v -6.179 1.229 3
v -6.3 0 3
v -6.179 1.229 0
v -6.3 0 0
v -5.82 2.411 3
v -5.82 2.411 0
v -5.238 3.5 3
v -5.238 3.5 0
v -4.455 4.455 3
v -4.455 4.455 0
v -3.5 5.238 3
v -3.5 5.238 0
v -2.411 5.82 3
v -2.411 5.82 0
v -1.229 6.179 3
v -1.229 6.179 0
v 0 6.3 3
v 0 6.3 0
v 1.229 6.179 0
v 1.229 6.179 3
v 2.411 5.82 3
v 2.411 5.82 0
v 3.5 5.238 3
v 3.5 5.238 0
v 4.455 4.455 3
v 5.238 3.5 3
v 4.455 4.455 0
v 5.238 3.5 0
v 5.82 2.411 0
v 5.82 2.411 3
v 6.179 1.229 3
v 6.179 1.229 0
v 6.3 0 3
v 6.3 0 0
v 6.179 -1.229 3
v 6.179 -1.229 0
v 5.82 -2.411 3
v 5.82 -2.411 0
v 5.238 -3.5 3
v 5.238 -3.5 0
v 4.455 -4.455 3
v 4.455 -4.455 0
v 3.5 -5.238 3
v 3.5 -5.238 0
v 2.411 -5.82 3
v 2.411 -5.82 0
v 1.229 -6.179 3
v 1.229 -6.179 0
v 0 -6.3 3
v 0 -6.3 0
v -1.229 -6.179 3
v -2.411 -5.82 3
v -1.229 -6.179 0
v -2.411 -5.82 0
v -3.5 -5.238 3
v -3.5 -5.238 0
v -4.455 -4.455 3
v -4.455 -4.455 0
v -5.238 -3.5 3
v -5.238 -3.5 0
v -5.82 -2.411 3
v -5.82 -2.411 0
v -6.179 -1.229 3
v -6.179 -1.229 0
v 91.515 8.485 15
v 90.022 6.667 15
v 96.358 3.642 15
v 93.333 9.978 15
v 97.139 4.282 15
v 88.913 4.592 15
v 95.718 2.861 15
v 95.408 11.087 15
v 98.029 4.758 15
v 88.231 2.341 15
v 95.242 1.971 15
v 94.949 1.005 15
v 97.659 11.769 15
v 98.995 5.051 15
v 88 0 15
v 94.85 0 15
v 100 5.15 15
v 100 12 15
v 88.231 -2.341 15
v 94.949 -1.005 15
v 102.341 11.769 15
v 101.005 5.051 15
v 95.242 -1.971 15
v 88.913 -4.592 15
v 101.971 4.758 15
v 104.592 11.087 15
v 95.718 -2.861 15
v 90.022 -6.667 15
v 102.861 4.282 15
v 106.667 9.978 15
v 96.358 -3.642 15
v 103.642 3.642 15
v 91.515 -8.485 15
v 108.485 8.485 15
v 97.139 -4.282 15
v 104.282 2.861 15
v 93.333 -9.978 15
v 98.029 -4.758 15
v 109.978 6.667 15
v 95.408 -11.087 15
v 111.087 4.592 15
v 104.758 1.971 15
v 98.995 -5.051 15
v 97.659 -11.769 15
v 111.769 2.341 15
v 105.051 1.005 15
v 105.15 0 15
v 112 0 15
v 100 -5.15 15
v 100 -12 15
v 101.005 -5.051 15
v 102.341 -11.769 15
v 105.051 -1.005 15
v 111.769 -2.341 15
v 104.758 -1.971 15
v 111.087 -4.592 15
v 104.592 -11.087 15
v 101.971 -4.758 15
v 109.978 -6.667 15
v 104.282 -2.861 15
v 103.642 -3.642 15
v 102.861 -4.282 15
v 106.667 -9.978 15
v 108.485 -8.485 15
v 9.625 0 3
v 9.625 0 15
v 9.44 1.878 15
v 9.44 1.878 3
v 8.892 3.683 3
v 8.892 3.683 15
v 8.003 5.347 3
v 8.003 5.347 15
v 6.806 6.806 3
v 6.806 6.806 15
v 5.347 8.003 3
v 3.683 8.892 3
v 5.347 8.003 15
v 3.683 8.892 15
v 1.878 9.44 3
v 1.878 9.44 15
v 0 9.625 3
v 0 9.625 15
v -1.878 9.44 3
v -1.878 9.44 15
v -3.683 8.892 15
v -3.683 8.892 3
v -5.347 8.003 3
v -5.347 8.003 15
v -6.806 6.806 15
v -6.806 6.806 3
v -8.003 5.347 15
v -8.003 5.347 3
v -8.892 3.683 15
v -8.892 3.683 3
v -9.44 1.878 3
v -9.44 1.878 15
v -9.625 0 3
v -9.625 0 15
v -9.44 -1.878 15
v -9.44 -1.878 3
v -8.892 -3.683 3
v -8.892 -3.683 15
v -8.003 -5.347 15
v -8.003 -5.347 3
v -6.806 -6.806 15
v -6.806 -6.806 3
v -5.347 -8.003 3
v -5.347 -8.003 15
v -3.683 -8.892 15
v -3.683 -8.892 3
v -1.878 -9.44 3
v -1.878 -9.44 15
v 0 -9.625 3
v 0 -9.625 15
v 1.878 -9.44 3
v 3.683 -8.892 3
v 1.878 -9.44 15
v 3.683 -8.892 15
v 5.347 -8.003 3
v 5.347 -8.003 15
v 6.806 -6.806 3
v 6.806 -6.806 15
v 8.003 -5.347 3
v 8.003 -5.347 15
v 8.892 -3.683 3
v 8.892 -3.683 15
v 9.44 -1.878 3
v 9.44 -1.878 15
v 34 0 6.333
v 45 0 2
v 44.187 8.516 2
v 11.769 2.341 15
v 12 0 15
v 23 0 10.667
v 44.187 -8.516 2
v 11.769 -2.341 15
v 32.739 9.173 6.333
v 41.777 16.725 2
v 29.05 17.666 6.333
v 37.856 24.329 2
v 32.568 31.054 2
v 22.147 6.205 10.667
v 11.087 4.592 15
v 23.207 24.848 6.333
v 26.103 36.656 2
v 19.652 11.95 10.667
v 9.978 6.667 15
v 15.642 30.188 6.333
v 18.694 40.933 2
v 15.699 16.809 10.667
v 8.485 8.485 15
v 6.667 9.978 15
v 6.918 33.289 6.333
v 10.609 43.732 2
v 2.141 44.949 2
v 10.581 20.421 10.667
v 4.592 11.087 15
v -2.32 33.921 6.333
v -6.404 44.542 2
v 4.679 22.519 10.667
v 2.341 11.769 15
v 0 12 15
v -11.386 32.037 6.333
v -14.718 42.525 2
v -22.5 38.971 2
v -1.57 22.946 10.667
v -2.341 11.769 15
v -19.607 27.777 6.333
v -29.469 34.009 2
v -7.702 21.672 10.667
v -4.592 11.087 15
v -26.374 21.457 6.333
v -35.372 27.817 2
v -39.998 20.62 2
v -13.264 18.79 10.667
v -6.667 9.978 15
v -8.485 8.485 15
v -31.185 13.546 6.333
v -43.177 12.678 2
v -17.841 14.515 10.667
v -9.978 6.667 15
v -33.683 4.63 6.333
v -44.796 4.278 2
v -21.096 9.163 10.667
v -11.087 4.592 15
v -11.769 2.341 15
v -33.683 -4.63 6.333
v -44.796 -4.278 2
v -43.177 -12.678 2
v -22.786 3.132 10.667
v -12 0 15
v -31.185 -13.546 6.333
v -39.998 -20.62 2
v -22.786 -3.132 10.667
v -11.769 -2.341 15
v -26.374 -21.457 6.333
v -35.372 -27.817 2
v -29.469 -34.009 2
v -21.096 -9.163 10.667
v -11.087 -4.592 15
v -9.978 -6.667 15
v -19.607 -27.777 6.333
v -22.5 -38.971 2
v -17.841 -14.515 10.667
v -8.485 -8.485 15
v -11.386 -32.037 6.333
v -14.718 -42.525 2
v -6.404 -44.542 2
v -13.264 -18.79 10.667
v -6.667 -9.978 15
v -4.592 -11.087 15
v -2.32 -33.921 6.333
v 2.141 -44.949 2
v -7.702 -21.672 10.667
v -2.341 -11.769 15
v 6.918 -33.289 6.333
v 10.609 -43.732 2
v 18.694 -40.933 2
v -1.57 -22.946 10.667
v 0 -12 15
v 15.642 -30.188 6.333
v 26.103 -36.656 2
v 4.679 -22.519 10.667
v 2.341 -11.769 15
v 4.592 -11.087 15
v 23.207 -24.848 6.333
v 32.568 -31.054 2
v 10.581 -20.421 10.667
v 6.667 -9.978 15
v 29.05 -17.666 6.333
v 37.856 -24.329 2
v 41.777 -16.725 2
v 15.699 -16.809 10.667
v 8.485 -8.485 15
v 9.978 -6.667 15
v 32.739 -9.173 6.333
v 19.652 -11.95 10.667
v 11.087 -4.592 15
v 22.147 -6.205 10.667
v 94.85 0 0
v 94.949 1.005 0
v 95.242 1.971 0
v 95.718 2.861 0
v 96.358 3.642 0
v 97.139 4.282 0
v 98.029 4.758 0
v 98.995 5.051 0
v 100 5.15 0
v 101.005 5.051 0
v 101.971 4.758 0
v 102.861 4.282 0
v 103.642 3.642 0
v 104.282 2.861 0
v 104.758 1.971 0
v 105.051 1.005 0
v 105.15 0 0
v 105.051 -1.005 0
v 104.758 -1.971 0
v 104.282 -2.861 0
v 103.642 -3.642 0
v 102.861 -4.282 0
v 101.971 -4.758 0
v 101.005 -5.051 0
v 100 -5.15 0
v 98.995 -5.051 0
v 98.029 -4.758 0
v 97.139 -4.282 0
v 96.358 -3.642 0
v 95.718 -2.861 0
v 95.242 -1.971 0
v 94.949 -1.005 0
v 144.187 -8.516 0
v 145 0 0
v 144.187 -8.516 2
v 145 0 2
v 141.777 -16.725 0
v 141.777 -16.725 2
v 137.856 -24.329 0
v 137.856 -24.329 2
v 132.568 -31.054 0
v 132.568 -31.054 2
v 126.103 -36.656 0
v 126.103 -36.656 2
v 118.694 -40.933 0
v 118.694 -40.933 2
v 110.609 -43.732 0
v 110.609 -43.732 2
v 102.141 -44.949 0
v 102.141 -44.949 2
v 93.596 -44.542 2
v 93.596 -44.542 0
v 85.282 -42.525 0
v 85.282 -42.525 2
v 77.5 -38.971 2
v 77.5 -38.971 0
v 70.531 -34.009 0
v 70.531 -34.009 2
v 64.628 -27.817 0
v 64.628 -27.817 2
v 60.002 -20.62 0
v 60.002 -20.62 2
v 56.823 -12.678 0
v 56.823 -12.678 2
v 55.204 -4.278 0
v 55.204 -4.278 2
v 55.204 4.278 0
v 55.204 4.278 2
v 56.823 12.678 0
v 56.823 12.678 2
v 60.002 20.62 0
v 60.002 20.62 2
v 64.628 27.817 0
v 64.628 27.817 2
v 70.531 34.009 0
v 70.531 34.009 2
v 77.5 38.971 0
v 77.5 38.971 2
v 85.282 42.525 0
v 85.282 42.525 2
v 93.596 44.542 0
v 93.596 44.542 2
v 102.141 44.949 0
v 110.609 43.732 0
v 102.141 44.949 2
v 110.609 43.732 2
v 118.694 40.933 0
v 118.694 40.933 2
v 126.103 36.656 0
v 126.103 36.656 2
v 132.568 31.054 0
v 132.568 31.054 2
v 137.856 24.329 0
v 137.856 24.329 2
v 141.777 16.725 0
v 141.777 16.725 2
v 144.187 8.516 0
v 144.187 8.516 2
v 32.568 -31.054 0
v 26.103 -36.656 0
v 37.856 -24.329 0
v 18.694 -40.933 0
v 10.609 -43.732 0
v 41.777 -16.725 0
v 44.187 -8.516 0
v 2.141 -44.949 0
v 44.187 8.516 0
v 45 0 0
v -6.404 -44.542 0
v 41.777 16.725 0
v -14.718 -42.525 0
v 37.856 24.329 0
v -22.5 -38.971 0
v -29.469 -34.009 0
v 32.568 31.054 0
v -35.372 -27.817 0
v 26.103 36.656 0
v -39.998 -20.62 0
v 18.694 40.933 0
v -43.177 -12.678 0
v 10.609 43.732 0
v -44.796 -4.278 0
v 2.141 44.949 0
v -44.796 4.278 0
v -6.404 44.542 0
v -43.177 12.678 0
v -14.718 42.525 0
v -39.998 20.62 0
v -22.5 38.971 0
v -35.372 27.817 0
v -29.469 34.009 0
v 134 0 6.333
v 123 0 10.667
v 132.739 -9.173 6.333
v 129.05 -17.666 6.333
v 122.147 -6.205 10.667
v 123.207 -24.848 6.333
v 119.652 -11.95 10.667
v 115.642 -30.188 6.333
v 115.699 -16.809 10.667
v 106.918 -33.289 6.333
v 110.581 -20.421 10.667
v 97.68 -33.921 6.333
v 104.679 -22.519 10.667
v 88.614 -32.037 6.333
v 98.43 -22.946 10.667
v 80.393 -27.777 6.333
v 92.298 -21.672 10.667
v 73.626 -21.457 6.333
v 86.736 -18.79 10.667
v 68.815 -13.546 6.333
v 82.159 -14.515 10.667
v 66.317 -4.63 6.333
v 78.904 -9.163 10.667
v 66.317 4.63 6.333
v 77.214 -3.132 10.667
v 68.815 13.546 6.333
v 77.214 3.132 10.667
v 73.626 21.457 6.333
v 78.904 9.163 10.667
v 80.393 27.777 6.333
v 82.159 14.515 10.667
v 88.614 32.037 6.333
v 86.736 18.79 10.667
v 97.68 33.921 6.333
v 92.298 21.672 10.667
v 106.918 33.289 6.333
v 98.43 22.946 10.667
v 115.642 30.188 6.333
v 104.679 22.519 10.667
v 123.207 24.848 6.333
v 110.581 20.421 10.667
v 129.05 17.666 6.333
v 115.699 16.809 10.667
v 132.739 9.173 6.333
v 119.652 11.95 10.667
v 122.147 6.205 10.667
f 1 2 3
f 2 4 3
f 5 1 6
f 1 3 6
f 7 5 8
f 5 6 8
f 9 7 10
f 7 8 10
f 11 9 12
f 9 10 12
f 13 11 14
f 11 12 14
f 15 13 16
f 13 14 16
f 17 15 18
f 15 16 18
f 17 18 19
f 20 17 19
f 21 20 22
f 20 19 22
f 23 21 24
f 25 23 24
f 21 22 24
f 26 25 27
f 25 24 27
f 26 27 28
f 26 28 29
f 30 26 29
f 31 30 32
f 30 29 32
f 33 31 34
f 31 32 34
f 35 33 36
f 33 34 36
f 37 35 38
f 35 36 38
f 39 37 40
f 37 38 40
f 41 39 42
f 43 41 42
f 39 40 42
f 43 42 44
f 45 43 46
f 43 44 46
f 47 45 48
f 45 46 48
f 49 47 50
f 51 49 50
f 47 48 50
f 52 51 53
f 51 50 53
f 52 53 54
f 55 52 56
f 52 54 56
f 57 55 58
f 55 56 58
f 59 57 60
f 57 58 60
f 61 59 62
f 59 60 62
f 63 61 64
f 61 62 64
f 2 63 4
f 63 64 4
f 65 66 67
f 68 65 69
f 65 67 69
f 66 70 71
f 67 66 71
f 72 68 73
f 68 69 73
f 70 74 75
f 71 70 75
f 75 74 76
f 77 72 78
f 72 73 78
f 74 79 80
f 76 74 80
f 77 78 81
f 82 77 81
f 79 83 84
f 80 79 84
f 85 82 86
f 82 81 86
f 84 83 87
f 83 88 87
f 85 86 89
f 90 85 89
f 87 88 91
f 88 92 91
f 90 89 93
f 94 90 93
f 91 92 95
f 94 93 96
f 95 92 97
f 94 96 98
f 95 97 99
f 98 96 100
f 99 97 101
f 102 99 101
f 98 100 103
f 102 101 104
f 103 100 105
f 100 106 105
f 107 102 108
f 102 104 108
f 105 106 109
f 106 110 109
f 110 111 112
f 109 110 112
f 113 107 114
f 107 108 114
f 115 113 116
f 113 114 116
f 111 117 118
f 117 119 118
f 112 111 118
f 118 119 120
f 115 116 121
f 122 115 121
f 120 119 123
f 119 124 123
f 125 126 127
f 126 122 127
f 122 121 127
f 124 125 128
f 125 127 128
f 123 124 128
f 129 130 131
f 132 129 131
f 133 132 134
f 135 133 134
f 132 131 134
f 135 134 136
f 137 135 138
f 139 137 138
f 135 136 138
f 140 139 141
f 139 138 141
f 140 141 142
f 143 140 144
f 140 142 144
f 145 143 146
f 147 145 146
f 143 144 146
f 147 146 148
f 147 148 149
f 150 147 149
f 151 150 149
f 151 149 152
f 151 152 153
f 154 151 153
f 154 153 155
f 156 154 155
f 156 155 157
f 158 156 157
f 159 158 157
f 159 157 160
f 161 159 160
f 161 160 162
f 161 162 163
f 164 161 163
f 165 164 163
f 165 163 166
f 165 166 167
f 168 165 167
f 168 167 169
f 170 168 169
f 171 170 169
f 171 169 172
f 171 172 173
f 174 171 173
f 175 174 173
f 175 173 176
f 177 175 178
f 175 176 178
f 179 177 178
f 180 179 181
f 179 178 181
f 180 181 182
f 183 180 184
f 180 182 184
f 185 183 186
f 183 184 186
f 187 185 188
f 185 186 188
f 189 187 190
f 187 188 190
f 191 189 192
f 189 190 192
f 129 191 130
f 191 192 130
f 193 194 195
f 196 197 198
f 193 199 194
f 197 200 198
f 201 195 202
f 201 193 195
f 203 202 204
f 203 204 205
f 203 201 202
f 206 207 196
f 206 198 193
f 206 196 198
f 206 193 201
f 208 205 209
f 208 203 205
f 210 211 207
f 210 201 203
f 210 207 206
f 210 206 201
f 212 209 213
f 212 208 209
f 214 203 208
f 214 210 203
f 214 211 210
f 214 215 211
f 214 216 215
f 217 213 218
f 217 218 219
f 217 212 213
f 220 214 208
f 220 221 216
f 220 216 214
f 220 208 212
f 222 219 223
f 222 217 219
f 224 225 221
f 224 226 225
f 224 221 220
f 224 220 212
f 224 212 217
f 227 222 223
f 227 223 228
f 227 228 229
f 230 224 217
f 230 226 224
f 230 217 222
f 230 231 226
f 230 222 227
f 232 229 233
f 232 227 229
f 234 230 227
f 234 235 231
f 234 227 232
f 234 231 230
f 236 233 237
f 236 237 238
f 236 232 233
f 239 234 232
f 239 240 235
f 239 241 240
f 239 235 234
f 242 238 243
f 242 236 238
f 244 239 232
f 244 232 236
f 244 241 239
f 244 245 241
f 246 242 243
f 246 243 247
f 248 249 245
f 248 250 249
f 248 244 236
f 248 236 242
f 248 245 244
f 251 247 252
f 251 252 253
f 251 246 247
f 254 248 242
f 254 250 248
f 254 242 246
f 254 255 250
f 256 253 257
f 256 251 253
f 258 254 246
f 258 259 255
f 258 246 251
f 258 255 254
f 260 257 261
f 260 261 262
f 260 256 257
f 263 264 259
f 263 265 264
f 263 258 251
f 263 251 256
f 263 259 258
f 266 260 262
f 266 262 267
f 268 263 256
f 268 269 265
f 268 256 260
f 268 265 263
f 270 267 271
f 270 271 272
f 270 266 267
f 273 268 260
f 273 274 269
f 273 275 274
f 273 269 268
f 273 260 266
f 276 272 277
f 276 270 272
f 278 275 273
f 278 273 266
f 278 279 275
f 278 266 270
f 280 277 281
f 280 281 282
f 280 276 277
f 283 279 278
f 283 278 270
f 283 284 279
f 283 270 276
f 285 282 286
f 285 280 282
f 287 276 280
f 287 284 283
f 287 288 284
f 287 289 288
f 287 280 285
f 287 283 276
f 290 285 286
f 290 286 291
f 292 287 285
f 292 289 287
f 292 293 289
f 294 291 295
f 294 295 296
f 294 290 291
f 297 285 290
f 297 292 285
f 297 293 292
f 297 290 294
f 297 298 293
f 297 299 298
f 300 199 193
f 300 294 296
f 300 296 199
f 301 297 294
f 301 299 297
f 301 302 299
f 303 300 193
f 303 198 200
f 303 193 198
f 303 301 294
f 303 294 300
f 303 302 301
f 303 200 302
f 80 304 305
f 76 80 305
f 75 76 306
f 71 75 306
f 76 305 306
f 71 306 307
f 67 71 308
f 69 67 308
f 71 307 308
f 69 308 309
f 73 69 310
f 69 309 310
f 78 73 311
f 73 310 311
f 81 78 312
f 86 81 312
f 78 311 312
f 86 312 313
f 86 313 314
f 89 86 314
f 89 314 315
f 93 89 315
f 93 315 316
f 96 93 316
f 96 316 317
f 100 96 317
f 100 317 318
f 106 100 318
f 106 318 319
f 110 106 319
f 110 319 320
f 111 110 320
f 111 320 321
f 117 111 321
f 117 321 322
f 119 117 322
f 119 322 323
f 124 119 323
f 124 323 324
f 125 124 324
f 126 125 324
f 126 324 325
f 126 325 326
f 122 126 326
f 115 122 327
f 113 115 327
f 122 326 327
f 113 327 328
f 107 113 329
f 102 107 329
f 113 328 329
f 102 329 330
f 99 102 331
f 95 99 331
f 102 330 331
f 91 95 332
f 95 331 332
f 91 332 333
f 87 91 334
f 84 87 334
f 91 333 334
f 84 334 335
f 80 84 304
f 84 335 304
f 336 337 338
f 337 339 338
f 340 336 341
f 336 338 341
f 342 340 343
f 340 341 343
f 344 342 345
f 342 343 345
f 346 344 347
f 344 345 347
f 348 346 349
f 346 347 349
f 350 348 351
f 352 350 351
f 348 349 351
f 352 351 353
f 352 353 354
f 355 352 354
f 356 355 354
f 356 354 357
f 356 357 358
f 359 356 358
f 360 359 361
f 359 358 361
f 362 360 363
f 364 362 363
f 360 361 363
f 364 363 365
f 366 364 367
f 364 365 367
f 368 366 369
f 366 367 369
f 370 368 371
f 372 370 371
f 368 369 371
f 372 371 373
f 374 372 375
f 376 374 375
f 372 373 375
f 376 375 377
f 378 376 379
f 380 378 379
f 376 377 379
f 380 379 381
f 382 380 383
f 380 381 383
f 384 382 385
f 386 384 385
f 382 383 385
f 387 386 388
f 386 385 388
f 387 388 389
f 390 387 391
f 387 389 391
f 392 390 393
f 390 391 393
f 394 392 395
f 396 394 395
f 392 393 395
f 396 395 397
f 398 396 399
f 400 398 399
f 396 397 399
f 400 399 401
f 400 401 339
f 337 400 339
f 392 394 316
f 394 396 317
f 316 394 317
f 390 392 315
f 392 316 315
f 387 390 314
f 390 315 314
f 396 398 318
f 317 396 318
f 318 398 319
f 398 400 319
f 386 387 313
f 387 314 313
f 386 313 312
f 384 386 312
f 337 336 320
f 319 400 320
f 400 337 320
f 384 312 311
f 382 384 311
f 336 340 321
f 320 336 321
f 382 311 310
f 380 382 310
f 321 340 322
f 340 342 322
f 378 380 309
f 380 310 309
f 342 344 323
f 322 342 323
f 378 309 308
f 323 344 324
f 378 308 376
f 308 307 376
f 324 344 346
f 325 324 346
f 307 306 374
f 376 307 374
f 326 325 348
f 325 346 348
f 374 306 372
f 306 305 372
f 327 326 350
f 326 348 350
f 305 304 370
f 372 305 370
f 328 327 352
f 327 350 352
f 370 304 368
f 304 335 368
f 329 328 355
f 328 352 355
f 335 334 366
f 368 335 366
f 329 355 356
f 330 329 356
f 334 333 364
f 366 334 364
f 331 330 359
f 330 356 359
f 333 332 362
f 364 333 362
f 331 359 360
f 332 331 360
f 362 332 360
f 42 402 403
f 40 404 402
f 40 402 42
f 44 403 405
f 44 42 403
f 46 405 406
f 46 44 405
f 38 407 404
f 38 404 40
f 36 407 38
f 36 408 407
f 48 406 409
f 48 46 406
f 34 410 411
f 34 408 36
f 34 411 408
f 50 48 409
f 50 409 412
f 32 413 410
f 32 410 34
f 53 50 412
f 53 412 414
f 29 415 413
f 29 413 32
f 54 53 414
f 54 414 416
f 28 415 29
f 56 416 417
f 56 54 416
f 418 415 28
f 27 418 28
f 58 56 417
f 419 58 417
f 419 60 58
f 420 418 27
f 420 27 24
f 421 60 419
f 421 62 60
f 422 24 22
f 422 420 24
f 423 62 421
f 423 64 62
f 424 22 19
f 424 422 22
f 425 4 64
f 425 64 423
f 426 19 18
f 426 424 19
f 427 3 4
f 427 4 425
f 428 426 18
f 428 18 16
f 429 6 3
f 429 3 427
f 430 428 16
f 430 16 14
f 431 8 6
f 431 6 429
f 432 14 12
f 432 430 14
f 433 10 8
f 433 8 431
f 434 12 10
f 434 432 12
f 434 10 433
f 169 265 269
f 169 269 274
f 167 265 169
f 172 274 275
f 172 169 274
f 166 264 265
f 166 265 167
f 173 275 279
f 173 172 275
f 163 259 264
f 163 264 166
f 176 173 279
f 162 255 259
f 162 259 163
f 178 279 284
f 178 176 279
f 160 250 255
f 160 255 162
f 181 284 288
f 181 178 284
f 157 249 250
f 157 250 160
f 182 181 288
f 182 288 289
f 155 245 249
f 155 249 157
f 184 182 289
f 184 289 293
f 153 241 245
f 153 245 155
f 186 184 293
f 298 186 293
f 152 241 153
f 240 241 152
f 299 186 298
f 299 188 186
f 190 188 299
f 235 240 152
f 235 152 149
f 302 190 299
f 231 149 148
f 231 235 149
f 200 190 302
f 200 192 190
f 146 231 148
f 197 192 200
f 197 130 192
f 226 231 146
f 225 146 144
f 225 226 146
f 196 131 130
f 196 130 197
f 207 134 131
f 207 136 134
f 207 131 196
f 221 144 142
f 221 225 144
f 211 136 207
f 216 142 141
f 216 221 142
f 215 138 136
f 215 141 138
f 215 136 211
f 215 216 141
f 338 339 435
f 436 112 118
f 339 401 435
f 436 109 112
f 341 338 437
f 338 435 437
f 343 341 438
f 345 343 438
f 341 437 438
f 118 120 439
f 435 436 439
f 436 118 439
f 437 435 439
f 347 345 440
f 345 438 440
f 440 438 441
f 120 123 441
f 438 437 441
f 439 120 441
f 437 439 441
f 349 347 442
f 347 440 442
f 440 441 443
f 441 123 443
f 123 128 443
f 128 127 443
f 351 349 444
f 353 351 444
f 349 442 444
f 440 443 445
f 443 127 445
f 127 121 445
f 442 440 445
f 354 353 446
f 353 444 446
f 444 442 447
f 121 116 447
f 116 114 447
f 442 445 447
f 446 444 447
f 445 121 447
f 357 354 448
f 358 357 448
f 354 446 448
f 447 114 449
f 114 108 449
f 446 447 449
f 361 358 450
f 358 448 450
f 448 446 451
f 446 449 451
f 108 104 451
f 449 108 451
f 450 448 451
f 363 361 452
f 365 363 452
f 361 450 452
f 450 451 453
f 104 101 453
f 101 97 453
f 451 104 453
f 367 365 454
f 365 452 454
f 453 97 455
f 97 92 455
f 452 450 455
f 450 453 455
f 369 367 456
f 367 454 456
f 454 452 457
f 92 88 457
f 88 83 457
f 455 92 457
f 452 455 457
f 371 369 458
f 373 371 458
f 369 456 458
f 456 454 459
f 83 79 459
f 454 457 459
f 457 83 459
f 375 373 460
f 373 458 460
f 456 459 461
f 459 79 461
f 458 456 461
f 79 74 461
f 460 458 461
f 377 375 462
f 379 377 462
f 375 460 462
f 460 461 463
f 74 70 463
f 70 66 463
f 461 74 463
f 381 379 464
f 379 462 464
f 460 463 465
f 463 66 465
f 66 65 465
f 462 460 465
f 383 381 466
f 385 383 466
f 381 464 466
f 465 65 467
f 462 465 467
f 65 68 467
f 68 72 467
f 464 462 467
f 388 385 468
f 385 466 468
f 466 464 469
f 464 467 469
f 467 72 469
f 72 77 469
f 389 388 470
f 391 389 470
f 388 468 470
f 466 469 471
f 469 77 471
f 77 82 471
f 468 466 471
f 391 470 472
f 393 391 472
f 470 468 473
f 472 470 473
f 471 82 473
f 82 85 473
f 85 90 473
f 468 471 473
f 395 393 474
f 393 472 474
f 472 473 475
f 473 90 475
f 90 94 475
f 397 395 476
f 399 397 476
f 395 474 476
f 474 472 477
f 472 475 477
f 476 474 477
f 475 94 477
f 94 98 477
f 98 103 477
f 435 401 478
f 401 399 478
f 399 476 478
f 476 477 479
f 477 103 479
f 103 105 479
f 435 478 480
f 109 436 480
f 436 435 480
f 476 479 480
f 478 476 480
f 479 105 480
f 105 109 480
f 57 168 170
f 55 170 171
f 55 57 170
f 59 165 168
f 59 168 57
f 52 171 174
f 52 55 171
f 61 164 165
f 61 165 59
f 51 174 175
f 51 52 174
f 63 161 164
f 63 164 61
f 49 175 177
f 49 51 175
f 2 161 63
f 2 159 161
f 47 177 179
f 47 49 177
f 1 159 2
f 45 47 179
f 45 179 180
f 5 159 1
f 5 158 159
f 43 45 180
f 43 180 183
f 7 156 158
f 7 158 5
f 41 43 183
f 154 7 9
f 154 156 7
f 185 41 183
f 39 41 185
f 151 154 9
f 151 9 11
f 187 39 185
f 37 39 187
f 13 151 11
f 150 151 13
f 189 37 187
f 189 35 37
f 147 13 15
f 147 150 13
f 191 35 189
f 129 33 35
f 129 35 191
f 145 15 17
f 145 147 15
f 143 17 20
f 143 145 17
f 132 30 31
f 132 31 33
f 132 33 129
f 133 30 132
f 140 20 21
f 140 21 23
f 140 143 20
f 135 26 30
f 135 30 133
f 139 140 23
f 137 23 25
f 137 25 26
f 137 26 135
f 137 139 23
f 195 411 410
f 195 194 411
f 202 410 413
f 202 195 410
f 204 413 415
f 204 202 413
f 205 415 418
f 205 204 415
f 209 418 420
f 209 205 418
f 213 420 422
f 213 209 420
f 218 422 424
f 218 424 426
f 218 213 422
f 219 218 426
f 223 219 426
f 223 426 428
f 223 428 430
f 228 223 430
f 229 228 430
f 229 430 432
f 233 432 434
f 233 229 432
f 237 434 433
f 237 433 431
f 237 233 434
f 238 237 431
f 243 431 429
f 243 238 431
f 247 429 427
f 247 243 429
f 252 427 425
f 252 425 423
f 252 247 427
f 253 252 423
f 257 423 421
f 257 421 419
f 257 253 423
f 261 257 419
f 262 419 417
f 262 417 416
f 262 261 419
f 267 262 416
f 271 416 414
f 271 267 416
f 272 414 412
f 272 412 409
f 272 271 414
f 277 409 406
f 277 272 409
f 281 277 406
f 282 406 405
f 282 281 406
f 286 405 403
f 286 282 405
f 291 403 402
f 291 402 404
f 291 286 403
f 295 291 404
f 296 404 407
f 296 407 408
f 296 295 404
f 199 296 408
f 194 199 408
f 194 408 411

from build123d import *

# Parameters (mm, degrees)
F3_D           = 12.6
F3_CBORE_D     = 19.25
F3_CBORE_DEPTH = 12
F9_D           = 10.3


with BuildPart() as f1:
    # F0 (on Front) → F1 (revolve)
    with BuildSketch(Plane.XZ):
        Polygon((0, 15), (0, 0), (45, 0), (45, 2), (12, 15), align=None)
    revolve(axis=Axis((0, 0, 10.7102552429), (0, 0, 1)))

    # F3 (through all)
    with Locations(Plane.XY.offset(15)):
        with Locations((0, 0)):
            CounterBoreHole(F3_D / 2, F3_CBORE_D / 2, F3_CBORE_DEPTH)


with BuildPart() as f4_1:
    # F4: copy of F1
    add(f1.part.moved(Location((100, 0, 0))))


with BuildPart() as f7:
    # F6 (on Front) → F7 (revolve)
    with BuildSketch(Plane.XZ):
        Polygon((100, 15), (100, 0), (145, 0), (145, 2), (112, 15), align=None)
    revolve(axis=Axis((100, 0, 7.5), (0, 0, -1)))

    # F9 (through all)
    with Locations(Plane.XY.offset(15)):
        with Locations((100, 0)):
            Hole(F9_D / 2)


solid = Compound([f1.part, f7.part])
